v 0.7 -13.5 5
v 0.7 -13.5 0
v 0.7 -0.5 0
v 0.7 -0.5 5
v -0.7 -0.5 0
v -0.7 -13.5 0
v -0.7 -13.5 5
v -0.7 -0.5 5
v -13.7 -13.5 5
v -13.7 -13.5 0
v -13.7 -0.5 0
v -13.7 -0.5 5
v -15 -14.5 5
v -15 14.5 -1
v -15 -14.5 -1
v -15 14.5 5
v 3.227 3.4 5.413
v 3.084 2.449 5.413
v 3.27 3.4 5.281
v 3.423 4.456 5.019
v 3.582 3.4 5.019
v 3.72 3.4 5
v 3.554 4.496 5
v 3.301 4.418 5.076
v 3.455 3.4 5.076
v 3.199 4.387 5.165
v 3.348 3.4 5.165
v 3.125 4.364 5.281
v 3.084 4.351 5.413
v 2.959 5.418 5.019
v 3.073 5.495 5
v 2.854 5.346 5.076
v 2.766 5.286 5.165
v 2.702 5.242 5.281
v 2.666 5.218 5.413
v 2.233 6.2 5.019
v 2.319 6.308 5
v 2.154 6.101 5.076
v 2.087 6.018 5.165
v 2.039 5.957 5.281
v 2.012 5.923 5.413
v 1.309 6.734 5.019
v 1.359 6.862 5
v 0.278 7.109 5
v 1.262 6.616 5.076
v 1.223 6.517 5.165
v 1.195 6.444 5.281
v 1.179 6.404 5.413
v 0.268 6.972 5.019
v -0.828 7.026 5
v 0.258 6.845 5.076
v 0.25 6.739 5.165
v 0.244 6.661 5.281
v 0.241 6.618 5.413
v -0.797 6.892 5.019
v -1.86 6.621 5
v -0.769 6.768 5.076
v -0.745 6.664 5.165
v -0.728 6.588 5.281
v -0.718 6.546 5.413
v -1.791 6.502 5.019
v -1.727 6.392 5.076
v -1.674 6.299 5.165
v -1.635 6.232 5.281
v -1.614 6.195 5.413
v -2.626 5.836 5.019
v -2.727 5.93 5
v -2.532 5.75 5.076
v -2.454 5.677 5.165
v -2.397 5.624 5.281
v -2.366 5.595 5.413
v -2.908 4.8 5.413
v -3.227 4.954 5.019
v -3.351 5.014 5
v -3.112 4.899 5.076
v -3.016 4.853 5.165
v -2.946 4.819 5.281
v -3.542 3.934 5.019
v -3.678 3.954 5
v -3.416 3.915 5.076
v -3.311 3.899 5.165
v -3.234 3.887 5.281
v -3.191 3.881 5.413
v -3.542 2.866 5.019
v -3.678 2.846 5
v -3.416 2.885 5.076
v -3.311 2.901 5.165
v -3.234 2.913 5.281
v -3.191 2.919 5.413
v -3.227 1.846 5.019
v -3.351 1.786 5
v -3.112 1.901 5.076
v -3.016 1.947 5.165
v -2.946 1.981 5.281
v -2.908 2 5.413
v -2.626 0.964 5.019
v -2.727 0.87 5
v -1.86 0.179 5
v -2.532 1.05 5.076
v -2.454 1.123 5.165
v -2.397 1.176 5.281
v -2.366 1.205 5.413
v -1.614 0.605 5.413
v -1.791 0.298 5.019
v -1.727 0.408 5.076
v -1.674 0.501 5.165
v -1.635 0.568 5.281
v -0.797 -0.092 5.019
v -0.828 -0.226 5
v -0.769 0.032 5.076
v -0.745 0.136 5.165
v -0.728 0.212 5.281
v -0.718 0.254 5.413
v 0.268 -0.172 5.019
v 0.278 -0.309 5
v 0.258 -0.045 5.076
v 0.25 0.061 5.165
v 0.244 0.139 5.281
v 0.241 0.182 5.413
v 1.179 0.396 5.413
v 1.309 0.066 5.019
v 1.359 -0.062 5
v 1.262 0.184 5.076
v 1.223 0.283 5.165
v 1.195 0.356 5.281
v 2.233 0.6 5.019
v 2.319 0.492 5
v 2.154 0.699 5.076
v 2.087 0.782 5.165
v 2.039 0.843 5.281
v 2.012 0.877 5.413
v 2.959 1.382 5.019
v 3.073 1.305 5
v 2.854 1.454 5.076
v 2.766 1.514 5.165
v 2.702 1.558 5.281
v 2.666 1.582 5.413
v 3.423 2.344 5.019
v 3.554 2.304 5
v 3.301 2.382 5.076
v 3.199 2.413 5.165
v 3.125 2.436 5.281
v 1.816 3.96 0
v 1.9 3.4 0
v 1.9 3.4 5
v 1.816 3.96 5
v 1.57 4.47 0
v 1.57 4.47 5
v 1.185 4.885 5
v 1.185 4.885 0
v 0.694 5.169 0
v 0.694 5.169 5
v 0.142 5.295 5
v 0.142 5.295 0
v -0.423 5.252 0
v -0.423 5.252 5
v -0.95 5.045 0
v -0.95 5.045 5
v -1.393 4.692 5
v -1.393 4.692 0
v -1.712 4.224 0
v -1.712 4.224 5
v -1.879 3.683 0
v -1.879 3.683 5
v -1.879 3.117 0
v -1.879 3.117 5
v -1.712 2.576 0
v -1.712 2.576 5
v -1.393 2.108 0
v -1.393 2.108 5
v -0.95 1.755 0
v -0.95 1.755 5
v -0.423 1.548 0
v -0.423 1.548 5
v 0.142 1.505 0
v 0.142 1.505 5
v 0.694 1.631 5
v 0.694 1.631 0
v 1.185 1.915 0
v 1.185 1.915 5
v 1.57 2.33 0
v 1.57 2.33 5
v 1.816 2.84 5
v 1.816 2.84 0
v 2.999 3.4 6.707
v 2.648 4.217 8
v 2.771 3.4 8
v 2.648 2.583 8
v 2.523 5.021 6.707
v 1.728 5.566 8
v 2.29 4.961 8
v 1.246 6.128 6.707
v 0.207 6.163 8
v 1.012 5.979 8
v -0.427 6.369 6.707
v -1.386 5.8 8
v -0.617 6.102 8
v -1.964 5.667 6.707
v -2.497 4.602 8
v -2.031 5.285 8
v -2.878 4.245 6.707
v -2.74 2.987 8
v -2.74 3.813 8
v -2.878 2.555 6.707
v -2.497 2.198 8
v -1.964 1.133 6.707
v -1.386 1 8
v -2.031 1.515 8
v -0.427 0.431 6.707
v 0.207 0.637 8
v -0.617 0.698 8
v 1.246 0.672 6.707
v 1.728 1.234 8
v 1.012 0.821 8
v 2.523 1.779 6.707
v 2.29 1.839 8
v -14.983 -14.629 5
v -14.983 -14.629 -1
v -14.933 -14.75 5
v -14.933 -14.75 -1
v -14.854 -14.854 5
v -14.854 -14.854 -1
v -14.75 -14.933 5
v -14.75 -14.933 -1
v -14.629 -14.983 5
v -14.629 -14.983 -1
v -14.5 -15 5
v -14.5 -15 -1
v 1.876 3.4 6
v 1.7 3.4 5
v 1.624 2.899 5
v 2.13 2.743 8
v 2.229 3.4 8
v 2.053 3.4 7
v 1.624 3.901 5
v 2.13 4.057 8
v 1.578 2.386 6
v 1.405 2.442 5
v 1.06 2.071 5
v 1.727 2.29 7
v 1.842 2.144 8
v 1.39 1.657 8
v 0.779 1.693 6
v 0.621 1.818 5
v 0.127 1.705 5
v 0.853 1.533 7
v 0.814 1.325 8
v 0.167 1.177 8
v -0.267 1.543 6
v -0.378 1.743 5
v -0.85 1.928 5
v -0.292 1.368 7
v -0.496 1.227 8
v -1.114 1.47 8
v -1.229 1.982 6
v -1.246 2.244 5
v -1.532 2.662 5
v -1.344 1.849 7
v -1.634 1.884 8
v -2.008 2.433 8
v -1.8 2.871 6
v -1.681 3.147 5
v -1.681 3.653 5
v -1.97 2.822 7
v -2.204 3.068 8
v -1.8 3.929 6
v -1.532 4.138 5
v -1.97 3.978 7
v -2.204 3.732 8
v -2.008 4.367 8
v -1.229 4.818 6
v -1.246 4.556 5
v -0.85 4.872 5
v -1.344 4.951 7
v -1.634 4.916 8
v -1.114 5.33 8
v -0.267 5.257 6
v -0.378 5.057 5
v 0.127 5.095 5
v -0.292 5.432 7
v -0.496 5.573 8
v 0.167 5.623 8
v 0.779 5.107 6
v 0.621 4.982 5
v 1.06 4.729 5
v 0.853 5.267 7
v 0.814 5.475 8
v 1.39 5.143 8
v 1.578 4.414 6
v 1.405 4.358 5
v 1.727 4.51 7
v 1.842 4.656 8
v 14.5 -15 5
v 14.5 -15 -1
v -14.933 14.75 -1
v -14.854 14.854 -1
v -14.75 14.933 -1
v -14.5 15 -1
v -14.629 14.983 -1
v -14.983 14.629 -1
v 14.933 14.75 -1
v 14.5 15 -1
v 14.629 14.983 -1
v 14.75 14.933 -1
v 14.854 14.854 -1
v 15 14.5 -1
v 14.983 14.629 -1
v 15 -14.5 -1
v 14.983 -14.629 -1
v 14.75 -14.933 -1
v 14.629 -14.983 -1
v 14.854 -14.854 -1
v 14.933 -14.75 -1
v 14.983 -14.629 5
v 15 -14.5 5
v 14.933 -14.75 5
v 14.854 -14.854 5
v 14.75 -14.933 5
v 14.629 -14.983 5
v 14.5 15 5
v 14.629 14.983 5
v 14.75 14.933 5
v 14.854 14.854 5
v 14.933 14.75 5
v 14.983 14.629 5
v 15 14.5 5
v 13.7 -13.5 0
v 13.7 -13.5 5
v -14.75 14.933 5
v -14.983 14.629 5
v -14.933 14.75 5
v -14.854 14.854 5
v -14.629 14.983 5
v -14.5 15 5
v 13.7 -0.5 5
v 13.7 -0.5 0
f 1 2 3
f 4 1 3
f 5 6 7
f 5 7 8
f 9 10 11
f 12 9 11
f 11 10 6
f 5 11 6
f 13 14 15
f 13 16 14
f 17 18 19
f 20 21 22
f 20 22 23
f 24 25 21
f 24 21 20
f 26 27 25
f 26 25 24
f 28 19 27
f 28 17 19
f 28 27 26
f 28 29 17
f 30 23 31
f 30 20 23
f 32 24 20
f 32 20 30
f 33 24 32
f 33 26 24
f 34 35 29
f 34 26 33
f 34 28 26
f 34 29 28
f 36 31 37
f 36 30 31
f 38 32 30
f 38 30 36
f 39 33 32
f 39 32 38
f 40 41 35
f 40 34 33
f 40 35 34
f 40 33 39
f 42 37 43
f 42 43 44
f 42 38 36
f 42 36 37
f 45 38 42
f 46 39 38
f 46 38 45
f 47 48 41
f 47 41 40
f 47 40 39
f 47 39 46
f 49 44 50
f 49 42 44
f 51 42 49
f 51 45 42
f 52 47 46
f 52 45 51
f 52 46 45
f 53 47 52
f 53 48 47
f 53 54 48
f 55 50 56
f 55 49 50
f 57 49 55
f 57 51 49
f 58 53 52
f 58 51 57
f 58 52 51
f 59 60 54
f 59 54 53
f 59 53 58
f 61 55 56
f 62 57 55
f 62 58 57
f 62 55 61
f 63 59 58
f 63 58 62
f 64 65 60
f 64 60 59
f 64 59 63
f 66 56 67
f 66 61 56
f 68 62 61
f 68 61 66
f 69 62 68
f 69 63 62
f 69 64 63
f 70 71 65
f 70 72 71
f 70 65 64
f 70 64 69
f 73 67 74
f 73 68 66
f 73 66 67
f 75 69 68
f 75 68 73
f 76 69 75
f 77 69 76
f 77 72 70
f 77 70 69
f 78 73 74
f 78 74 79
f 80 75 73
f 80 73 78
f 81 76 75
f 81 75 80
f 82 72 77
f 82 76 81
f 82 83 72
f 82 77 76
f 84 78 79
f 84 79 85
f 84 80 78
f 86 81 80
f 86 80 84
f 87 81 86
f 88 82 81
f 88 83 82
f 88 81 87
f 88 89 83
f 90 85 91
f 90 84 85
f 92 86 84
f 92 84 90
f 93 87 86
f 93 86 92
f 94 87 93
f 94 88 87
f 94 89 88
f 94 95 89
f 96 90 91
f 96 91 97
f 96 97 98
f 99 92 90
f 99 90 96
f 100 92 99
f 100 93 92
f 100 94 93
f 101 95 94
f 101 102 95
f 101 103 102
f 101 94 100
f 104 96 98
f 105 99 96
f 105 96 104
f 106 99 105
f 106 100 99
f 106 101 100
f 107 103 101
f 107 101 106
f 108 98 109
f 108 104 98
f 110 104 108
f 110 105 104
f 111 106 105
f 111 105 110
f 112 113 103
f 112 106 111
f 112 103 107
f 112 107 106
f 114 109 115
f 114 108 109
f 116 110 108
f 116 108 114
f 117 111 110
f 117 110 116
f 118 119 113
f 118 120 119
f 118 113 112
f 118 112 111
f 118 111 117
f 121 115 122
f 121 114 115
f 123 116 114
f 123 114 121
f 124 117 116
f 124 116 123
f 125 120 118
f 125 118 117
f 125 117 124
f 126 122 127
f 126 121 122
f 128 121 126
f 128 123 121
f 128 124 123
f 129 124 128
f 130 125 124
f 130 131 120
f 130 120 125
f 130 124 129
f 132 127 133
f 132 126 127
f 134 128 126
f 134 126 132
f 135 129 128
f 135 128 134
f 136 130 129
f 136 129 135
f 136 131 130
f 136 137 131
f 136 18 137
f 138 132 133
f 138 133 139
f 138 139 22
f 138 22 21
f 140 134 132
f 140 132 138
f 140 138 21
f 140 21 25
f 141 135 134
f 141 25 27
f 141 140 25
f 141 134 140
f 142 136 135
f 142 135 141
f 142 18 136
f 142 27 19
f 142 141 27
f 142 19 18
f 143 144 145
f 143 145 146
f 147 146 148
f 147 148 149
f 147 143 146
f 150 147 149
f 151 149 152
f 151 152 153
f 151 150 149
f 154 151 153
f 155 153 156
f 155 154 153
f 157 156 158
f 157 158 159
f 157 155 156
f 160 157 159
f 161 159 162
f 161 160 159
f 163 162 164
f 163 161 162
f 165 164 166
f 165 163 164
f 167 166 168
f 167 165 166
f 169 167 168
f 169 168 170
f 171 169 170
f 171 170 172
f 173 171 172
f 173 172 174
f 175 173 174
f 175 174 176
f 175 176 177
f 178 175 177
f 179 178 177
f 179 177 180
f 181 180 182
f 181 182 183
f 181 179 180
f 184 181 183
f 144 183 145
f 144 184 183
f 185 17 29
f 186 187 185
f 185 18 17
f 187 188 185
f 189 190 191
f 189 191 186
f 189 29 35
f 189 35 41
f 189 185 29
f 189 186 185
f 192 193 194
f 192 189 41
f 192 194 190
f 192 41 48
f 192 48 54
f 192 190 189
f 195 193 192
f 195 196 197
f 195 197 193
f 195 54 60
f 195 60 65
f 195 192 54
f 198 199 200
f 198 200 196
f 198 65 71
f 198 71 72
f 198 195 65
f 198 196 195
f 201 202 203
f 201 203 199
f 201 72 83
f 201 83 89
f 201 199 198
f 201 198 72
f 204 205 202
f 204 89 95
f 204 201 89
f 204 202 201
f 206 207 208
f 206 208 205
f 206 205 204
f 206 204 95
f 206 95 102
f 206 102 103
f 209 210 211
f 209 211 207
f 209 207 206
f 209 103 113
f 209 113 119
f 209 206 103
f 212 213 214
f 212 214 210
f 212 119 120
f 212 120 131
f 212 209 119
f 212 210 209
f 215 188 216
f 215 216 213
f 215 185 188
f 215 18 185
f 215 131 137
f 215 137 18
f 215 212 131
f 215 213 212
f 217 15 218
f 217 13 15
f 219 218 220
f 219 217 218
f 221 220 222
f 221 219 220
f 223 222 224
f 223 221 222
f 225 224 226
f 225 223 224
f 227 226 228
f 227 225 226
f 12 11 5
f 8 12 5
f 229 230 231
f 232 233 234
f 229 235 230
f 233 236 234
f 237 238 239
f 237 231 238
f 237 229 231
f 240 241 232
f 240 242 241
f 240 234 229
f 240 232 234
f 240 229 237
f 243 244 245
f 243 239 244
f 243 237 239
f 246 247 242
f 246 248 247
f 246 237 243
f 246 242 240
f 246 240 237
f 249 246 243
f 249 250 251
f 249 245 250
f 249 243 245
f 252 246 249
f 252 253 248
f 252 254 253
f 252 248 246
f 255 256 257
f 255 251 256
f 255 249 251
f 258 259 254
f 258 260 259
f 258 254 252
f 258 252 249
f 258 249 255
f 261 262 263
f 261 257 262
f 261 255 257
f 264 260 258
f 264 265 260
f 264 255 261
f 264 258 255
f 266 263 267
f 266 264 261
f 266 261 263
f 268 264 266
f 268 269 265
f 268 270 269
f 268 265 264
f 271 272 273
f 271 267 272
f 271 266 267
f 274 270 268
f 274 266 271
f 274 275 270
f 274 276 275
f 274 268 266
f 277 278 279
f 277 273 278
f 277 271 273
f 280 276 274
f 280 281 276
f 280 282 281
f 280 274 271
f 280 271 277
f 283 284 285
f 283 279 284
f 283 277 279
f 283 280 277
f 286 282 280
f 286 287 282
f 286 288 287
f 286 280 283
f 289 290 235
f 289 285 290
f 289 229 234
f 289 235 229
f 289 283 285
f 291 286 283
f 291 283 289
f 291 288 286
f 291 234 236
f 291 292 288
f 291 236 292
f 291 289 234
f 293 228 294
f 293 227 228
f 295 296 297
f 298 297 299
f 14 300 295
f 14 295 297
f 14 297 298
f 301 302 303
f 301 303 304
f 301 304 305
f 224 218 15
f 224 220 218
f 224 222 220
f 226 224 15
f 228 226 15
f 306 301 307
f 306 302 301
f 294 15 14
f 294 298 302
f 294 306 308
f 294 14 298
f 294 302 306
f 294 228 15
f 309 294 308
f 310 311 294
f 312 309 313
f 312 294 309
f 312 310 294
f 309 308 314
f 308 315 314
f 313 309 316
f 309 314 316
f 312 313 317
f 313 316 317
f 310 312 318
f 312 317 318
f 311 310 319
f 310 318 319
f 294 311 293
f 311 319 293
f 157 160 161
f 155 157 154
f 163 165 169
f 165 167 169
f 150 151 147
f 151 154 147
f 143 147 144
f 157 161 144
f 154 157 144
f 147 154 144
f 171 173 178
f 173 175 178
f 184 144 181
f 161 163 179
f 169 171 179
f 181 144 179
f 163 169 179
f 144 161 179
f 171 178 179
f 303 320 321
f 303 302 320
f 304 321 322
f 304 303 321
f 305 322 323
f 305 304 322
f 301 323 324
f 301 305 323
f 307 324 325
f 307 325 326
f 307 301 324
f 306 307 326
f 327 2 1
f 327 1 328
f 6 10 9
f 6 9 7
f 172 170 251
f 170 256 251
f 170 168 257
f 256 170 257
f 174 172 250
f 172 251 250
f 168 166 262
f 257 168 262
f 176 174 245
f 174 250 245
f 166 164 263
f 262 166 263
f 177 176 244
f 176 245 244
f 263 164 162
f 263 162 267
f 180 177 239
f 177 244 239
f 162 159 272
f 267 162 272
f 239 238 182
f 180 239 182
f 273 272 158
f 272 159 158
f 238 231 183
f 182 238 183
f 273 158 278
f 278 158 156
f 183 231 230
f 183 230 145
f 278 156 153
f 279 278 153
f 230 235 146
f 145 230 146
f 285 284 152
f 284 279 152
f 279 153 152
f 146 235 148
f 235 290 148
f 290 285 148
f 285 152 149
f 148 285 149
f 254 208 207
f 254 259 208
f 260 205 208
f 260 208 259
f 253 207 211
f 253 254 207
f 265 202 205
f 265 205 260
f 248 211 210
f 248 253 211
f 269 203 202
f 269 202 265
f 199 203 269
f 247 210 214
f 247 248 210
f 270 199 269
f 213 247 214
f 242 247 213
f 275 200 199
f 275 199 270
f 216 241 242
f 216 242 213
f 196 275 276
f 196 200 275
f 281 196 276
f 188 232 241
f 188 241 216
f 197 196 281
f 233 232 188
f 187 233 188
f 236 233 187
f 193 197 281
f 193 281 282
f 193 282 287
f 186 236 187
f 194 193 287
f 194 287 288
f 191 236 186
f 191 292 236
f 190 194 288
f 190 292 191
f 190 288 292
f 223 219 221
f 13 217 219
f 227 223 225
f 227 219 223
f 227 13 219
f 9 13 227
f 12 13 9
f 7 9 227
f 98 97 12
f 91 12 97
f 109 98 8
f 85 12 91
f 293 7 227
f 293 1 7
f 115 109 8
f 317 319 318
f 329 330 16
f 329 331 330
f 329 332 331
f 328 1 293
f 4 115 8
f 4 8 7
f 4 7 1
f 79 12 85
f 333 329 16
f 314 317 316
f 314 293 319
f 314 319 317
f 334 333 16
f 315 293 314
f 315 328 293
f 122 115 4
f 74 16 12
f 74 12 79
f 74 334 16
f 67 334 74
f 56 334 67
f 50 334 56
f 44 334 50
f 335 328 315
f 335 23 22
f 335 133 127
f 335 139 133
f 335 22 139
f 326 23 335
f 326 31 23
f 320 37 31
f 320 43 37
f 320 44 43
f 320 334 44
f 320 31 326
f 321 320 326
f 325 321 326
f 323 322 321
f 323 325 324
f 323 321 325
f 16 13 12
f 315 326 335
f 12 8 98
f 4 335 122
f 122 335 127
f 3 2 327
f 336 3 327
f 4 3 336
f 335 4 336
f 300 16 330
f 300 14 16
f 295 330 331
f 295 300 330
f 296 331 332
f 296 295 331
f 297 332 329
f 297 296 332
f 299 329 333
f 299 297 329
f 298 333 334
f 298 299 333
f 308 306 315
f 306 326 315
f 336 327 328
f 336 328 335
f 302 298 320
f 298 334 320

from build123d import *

# Parameters (mm, degrees)
F0_W     = 30
F0_H     = 30
F0_W_2   = 13
F0_H_2   = 13
F0_R     = 1.9
F1_DEPTH = 5
F2_R     = 3.3
F2_R_2   = 1.7
F3_DEPTH = 3
F3_TAPER = 10
F4_W     = 30
F4_H     = 30
F5_DEPTH = 1
F6_R     = 0.5


with BuildPart() as f1:
    # F0 (on Top) → F1 (new body)
    with BuildSketch(Plane.XY):
        Rectangle(F0_W, F0_H)
        with Locations((-7.2, -7)):
            Rectangle(F0_W_2, F0_H_2, mode=Mode.SUBTRACT)
        with Locations((7.2, -7)):
            Rectangle(F0_W_2, F0_H_2, mode=Mode.SUBTRACT)
        with Locations((0, 3.4)):
            Circle(F0_R, mode=Mode.SUBTRACT)
    extrude(amount=F1_DEPTH)

    # F2 (on face) → F3 (join)
    with BuildSketch(Plane.XY.offset(5)):
        with Locations((0, 3.4)):
            Circle(F2_R)
        with Locations((0, 3.4)):
            Circle(F2_R_2, mode=Mode.SUBTRACT)
    extrude(amount=F3_DEPTH, taper=F3_TAPER)

    # F4 (on face) → F5 (join)
    with BuildSketch(Plane(origin=(0, 0, 0), x_dir=(1, 0, 0), z_dir=(0, 0, -1))):
        Rectangle(F4_W, F4_H)
    extrude(amount=F5_DEPTH)

    # F6
    f6_edges = [f1.edges().sort_by_distance(p)[0] for p in [
        (-15, -15, 2),
        (15, -15, 2),
        (15, 15, 2),
        (-15, 15, 2),
        (-3.3, 3.4, 5),
    ]]
    fillet(f6_edges, radius=F6_R)


solid = f1.part
